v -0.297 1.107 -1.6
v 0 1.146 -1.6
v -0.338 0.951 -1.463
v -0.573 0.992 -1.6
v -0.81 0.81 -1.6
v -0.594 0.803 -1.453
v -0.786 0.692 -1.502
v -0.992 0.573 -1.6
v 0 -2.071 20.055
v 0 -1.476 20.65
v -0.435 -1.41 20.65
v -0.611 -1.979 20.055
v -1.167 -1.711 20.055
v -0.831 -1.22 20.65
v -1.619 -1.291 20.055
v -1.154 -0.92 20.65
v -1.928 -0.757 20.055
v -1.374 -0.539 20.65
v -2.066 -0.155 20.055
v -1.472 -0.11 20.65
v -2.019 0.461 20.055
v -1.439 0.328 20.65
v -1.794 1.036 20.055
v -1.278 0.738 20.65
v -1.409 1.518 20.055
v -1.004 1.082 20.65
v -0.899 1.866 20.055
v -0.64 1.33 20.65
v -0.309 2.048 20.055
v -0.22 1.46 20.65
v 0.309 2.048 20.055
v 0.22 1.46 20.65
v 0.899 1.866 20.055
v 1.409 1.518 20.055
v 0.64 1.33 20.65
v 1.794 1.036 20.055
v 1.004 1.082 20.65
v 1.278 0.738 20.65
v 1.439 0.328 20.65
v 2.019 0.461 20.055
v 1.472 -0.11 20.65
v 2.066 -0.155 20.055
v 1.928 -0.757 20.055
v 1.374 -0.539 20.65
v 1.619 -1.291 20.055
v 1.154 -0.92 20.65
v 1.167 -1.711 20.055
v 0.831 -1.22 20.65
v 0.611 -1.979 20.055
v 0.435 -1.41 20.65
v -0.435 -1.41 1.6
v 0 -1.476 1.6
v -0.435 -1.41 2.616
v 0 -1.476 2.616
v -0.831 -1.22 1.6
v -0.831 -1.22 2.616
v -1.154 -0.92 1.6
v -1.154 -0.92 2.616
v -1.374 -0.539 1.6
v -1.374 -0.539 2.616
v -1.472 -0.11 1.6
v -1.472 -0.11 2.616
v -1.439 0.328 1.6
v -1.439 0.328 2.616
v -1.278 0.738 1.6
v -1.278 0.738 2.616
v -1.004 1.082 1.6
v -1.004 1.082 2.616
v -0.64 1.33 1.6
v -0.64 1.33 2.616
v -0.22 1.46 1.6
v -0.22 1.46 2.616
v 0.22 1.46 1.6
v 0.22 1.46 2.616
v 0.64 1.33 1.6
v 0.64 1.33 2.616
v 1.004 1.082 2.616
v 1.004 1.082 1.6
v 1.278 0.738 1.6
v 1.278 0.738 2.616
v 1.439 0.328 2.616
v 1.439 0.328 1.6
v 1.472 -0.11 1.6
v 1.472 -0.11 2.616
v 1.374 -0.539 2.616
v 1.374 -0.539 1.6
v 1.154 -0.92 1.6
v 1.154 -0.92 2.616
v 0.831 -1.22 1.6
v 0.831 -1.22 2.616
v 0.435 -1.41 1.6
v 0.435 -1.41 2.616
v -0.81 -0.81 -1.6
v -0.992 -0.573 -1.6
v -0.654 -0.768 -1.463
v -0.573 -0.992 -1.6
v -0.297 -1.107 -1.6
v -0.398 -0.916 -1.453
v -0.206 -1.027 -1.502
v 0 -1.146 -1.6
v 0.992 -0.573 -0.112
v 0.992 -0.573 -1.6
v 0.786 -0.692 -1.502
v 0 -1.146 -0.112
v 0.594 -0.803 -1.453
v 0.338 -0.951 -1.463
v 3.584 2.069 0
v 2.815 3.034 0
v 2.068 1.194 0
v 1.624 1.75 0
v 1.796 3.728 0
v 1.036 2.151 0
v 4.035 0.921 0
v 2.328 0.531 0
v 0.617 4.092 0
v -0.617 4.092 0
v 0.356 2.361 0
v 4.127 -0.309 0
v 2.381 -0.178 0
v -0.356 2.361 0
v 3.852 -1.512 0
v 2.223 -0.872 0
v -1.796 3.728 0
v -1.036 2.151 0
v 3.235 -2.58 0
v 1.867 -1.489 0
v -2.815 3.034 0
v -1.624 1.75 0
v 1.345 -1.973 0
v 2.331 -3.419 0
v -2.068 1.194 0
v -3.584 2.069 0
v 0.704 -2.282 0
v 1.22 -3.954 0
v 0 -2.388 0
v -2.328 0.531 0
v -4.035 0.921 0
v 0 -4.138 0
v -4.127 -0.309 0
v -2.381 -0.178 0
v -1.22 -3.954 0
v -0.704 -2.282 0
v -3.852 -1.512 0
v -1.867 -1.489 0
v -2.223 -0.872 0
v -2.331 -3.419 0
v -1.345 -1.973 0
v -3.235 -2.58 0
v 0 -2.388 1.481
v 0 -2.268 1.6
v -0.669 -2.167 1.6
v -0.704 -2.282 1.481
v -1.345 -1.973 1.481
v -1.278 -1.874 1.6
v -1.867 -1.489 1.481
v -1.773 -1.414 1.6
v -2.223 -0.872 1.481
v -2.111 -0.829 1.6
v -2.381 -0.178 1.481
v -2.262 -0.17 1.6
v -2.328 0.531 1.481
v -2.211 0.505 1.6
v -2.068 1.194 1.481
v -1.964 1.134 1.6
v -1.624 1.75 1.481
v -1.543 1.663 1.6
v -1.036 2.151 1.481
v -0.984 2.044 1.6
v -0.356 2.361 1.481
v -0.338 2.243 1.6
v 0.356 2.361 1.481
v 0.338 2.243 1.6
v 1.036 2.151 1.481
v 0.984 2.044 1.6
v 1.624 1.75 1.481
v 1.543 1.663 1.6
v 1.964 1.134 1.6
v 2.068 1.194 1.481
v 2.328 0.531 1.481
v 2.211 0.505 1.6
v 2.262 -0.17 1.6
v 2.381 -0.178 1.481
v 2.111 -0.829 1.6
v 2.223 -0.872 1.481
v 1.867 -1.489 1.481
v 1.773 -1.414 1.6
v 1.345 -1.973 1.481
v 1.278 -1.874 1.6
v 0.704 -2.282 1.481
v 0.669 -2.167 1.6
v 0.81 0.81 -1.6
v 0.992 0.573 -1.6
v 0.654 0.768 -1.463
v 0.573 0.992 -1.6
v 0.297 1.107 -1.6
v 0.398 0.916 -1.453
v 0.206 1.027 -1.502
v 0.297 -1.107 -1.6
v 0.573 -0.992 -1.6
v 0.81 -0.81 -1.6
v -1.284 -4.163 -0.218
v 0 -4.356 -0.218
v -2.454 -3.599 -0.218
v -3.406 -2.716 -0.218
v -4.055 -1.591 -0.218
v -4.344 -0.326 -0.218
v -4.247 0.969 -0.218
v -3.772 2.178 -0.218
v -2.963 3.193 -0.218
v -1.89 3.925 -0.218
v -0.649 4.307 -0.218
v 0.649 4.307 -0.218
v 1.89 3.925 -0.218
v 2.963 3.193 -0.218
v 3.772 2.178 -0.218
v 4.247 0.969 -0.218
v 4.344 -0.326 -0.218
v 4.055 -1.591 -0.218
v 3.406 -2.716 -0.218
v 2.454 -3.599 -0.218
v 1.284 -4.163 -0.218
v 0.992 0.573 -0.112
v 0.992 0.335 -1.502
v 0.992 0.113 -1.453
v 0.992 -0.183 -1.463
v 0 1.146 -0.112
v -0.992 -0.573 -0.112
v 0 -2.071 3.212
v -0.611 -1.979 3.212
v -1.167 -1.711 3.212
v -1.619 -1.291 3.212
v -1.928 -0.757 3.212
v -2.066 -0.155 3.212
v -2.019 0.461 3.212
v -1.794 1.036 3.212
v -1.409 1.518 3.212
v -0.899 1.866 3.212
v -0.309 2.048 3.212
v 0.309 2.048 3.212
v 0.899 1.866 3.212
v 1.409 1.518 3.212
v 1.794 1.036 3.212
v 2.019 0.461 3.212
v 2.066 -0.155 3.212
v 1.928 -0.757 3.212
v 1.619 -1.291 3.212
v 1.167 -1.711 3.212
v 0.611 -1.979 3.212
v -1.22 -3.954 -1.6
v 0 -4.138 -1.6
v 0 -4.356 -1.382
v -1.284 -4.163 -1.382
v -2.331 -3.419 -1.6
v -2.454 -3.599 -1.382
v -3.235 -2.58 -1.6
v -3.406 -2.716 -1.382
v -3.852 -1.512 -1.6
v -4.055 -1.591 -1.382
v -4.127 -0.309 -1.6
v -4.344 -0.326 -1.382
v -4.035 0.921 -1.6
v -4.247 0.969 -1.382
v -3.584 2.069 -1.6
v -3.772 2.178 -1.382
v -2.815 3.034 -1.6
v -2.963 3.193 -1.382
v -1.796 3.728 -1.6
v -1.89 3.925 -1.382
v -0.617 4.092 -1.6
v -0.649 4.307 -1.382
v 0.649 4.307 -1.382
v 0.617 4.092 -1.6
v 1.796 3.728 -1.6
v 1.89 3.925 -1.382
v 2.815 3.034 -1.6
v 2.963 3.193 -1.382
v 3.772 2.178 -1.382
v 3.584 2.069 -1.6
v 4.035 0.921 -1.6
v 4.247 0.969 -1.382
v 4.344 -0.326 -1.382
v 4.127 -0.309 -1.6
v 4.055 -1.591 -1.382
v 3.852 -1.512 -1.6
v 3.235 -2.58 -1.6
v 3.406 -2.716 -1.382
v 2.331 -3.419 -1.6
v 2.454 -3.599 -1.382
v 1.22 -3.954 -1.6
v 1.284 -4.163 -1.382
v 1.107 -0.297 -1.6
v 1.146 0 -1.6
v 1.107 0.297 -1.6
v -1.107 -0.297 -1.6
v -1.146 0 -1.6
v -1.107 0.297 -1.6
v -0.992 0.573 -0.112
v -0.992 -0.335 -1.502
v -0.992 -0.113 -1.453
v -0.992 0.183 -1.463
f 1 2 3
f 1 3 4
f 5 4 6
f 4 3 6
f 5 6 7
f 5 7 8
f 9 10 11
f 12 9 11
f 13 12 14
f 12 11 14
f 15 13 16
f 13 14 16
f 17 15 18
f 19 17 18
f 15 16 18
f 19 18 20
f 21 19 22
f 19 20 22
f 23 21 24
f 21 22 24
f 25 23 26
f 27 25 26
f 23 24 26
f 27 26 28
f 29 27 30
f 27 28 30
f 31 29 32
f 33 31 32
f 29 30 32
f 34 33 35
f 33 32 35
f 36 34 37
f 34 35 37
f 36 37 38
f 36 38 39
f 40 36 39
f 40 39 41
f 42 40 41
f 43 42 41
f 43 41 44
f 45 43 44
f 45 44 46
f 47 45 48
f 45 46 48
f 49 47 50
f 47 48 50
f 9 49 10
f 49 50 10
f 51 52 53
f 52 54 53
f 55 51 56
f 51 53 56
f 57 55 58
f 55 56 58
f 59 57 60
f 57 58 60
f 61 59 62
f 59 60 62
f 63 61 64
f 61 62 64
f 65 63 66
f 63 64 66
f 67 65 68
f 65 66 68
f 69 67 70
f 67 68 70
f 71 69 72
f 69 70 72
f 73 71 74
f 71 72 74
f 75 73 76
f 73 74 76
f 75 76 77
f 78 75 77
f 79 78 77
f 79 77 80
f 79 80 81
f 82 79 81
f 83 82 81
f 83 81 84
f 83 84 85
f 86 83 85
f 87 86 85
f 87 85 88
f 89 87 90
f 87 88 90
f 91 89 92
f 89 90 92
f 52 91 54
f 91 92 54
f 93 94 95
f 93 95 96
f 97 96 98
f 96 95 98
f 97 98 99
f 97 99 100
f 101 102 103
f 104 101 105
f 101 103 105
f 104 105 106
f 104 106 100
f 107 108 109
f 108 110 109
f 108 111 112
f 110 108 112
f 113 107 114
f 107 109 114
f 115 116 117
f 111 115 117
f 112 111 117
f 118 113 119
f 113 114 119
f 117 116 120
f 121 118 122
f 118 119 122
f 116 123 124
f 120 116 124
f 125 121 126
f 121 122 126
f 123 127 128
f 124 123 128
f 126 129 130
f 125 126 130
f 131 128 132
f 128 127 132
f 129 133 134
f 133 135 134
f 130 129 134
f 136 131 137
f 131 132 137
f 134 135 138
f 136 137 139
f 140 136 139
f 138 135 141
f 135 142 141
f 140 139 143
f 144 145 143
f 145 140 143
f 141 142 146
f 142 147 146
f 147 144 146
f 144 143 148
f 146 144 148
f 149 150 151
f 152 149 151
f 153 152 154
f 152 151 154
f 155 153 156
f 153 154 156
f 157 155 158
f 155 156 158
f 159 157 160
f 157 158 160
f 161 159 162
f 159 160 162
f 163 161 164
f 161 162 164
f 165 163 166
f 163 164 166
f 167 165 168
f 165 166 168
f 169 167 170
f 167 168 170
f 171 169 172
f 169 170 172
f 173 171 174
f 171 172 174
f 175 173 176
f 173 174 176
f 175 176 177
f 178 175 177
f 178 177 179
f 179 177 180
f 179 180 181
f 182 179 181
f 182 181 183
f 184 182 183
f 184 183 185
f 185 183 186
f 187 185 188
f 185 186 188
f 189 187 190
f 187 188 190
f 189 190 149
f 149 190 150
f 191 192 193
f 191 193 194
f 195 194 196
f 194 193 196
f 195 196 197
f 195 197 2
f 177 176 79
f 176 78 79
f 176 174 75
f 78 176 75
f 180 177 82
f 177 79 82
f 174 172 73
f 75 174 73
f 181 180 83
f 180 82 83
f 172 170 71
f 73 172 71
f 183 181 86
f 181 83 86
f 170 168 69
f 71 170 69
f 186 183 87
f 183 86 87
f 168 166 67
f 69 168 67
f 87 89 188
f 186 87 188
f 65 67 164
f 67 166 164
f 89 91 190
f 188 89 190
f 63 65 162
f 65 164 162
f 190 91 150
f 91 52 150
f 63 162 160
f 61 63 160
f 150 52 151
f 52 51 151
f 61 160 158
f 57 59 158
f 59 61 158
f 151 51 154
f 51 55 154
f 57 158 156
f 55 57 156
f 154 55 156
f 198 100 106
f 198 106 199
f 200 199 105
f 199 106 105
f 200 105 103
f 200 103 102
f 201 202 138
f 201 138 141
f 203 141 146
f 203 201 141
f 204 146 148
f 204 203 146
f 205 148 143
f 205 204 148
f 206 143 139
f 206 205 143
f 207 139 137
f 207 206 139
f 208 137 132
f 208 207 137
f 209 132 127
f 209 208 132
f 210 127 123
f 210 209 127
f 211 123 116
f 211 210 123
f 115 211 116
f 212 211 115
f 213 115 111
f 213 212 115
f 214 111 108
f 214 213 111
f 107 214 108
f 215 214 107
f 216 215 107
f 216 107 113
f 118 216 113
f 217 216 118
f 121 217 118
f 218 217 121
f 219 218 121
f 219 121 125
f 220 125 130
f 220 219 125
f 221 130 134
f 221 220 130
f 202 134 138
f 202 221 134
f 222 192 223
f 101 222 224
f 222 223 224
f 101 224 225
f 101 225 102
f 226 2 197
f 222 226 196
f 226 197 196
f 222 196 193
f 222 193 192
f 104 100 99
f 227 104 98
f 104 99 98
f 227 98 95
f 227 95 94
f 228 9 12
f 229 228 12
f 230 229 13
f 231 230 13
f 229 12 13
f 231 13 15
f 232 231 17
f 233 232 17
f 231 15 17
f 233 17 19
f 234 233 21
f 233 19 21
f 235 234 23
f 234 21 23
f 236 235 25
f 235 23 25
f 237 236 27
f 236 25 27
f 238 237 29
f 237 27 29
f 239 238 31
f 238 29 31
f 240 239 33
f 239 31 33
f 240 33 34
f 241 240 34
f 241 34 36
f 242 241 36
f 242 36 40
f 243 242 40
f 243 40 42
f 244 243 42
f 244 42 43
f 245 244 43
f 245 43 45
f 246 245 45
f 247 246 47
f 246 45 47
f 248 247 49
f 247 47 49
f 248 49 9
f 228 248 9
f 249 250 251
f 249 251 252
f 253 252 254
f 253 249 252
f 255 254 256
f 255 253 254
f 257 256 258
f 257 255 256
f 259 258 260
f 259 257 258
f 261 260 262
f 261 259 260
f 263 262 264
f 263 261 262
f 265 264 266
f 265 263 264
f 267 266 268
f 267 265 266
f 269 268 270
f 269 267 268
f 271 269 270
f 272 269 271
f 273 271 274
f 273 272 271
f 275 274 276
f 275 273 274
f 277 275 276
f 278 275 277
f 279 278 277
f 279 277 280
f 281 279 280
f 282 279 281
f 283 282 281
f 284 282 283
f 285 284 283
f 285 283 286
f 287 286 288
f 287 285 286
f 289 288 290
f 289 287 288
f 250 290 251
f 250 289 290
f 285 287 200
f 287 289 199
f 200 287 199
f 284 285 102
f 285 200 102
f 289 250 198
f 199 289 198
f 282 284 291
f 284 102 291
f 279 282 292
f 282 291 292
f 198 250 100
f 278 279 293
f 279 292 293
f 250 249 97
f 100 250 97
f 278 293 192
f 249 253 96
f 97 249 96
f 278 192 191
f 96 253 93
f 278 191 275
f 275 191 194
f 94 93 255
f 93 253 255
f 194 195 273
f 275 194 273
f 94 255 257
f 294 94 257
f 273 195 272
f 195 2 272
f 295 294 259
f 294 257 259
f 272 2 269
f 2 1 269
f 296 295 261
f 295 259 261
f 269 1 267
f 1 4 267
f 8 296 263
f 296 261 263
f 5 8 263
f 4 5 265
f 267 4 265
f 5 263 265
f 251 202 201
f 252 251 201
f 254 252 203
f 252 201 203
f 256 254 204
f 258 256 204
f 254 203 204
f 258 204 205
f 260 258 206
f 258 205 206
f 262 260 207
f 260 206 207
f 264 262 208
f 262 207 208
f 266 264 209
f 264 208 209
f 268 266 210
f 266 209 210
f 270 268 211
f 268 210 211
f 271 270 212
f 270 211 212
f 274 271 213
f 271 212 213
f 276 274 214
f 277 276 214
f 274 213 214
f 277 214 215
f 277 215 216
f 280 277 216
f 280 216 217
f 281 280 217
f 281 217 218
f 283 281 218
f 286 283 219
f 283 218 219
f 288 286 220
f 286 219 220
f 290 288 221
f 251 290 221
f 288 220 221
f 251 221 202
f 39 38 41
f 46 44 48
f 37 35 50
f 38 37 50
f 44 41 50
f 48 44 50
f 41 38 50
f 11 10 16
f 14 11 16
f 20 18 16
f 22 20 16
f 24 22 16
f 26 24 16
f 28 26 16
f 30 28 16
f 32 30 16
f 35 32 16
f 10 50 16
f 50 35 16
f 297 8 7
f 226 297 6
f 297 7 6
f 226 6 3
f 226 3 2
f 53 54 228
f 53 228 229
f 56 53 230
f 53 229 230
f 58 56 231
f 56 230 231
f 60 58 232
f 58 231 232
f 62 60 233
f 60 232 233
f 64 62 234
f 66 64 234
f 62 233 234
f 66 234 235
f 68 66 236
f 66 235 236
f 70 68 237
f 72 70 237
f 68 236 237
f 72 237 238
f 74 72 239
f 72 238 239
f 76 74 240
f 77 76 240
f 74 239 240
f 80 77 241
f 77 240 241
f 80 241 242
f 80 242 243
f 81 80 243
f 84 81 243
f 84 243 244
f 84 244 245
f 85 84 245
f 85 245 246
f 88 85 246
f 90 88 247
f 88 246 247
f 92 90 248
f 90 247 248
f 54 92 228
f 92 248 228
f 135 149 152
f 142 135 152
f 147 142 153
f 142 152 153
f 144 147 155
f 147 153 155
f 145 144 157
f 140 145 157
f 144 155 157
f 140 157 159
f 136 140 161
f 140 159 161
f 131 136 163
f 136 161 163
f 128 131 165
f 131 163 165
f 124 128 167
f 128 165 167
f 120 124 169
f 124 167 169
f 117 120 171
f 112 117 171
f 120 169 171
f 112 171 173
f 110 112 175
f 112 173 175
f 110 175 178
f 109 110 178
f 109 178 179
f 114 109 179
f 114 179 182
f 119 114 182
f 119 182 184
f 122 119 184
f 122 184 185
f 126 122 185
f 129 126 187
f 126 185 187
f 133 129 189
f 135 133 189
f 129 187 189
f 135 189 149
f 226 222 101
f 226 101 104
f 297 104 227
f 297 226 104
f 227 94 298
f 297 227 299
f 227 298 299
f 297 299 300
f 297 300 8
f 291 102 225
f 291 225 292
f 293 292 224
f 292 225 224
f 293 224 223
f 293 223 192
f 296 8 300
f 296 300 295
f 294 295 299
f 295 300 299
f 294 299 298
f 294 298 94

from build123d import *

# Parameters (mm, degrees)
CHAMFER2_SIZE      = 0.5953125
CUT_EXTRUDE1_DEPTH = 1.48828125
CHAMFER1_SIZE      = 0.217805
CHAMFER3_SIZE      = 0.11938


with BuildPart() as part:
    # Sketch13 → Revolve1 (revolve)
    with BuildSketch(Plane(origin=(0, 0, 0), x_dir=(0, 0, -1), z_dir=(1, 0, 0))):
        Polygon((1.6002, 4.3561), (0, 4.3561), (0, 2.3876), (-1.6002, 2.3876), (-1.6002, 1.4760575), (-2.6162, 1.4760575), (-3.2115125, 2.07137), (-20.6502, 2.07137), (-20.6502, 0), (1.6002, 0), align=None)
    revolve(axis=Axis((0, 0, 20.6502), (0, 0, -1)))

    # Chamfer2
    chamfer2_edges = [part.edges().sort_by_distance(p)[0] for p in [
        (0, -2.07137, 20.6502),
    ]]
    chamfer(chamfer2_edges, length=CHAMFER2_SIZE)

    # Sketch7 → Cut-Extrude1 (cut)
    with BuildSketch(Plane(origin=(0, 0, -1.6002), x_dir=(-1, 0, 0), z_dir=(0, 0, -1))):
        Polygon((0, 1.14567944), (-0.9921875, 0.57283972), (-0.9921875, -0.57283972), (0, -1.14567944), (0.9921875, -0.57283972), (0.9921875, 0.57283972), align=None)
    extrude(amount=-CUT_EXTRUDE1_DEPTH, mode=Mode.SUBTRACT)

    # Chamfer1
    chamfer1_edges = [part.edges().sort_by_distance(p)[0] for p in [
        (0, -4.3561, -1.6002),
        (0, -4.3561, 0),
    ]]
    chamfer(chamfer1_edges, length=CHAMFER1_SIZE)

    # Cut-Extrude2 cone 1 section (through the dimple's axis) → Cut-Extrude2 (revolve, cut)
    with BuildSketch(Plane(origin=(0, 0, -1.6002), x_dir=(0, 1, 0), z_dir=(1, 0, 0))):
        Polygon((0, 0), (1.14567944, 0), (0, 1.14567944), align=None)
    revolve(axis=Axis((0, 0, -1.6002), (0, 0, 1)), mode=Mode.SUBTRACT)

    # Chamfer3
    chamfer3_edges = [part.edges().sort_by_distance(p)[0] for p in [
        (0, -2.3876, 1.6002),
    ]]
    chamfer(chamfer3_edges, length=CHAMFER3_SIZE)


solid = part.part
